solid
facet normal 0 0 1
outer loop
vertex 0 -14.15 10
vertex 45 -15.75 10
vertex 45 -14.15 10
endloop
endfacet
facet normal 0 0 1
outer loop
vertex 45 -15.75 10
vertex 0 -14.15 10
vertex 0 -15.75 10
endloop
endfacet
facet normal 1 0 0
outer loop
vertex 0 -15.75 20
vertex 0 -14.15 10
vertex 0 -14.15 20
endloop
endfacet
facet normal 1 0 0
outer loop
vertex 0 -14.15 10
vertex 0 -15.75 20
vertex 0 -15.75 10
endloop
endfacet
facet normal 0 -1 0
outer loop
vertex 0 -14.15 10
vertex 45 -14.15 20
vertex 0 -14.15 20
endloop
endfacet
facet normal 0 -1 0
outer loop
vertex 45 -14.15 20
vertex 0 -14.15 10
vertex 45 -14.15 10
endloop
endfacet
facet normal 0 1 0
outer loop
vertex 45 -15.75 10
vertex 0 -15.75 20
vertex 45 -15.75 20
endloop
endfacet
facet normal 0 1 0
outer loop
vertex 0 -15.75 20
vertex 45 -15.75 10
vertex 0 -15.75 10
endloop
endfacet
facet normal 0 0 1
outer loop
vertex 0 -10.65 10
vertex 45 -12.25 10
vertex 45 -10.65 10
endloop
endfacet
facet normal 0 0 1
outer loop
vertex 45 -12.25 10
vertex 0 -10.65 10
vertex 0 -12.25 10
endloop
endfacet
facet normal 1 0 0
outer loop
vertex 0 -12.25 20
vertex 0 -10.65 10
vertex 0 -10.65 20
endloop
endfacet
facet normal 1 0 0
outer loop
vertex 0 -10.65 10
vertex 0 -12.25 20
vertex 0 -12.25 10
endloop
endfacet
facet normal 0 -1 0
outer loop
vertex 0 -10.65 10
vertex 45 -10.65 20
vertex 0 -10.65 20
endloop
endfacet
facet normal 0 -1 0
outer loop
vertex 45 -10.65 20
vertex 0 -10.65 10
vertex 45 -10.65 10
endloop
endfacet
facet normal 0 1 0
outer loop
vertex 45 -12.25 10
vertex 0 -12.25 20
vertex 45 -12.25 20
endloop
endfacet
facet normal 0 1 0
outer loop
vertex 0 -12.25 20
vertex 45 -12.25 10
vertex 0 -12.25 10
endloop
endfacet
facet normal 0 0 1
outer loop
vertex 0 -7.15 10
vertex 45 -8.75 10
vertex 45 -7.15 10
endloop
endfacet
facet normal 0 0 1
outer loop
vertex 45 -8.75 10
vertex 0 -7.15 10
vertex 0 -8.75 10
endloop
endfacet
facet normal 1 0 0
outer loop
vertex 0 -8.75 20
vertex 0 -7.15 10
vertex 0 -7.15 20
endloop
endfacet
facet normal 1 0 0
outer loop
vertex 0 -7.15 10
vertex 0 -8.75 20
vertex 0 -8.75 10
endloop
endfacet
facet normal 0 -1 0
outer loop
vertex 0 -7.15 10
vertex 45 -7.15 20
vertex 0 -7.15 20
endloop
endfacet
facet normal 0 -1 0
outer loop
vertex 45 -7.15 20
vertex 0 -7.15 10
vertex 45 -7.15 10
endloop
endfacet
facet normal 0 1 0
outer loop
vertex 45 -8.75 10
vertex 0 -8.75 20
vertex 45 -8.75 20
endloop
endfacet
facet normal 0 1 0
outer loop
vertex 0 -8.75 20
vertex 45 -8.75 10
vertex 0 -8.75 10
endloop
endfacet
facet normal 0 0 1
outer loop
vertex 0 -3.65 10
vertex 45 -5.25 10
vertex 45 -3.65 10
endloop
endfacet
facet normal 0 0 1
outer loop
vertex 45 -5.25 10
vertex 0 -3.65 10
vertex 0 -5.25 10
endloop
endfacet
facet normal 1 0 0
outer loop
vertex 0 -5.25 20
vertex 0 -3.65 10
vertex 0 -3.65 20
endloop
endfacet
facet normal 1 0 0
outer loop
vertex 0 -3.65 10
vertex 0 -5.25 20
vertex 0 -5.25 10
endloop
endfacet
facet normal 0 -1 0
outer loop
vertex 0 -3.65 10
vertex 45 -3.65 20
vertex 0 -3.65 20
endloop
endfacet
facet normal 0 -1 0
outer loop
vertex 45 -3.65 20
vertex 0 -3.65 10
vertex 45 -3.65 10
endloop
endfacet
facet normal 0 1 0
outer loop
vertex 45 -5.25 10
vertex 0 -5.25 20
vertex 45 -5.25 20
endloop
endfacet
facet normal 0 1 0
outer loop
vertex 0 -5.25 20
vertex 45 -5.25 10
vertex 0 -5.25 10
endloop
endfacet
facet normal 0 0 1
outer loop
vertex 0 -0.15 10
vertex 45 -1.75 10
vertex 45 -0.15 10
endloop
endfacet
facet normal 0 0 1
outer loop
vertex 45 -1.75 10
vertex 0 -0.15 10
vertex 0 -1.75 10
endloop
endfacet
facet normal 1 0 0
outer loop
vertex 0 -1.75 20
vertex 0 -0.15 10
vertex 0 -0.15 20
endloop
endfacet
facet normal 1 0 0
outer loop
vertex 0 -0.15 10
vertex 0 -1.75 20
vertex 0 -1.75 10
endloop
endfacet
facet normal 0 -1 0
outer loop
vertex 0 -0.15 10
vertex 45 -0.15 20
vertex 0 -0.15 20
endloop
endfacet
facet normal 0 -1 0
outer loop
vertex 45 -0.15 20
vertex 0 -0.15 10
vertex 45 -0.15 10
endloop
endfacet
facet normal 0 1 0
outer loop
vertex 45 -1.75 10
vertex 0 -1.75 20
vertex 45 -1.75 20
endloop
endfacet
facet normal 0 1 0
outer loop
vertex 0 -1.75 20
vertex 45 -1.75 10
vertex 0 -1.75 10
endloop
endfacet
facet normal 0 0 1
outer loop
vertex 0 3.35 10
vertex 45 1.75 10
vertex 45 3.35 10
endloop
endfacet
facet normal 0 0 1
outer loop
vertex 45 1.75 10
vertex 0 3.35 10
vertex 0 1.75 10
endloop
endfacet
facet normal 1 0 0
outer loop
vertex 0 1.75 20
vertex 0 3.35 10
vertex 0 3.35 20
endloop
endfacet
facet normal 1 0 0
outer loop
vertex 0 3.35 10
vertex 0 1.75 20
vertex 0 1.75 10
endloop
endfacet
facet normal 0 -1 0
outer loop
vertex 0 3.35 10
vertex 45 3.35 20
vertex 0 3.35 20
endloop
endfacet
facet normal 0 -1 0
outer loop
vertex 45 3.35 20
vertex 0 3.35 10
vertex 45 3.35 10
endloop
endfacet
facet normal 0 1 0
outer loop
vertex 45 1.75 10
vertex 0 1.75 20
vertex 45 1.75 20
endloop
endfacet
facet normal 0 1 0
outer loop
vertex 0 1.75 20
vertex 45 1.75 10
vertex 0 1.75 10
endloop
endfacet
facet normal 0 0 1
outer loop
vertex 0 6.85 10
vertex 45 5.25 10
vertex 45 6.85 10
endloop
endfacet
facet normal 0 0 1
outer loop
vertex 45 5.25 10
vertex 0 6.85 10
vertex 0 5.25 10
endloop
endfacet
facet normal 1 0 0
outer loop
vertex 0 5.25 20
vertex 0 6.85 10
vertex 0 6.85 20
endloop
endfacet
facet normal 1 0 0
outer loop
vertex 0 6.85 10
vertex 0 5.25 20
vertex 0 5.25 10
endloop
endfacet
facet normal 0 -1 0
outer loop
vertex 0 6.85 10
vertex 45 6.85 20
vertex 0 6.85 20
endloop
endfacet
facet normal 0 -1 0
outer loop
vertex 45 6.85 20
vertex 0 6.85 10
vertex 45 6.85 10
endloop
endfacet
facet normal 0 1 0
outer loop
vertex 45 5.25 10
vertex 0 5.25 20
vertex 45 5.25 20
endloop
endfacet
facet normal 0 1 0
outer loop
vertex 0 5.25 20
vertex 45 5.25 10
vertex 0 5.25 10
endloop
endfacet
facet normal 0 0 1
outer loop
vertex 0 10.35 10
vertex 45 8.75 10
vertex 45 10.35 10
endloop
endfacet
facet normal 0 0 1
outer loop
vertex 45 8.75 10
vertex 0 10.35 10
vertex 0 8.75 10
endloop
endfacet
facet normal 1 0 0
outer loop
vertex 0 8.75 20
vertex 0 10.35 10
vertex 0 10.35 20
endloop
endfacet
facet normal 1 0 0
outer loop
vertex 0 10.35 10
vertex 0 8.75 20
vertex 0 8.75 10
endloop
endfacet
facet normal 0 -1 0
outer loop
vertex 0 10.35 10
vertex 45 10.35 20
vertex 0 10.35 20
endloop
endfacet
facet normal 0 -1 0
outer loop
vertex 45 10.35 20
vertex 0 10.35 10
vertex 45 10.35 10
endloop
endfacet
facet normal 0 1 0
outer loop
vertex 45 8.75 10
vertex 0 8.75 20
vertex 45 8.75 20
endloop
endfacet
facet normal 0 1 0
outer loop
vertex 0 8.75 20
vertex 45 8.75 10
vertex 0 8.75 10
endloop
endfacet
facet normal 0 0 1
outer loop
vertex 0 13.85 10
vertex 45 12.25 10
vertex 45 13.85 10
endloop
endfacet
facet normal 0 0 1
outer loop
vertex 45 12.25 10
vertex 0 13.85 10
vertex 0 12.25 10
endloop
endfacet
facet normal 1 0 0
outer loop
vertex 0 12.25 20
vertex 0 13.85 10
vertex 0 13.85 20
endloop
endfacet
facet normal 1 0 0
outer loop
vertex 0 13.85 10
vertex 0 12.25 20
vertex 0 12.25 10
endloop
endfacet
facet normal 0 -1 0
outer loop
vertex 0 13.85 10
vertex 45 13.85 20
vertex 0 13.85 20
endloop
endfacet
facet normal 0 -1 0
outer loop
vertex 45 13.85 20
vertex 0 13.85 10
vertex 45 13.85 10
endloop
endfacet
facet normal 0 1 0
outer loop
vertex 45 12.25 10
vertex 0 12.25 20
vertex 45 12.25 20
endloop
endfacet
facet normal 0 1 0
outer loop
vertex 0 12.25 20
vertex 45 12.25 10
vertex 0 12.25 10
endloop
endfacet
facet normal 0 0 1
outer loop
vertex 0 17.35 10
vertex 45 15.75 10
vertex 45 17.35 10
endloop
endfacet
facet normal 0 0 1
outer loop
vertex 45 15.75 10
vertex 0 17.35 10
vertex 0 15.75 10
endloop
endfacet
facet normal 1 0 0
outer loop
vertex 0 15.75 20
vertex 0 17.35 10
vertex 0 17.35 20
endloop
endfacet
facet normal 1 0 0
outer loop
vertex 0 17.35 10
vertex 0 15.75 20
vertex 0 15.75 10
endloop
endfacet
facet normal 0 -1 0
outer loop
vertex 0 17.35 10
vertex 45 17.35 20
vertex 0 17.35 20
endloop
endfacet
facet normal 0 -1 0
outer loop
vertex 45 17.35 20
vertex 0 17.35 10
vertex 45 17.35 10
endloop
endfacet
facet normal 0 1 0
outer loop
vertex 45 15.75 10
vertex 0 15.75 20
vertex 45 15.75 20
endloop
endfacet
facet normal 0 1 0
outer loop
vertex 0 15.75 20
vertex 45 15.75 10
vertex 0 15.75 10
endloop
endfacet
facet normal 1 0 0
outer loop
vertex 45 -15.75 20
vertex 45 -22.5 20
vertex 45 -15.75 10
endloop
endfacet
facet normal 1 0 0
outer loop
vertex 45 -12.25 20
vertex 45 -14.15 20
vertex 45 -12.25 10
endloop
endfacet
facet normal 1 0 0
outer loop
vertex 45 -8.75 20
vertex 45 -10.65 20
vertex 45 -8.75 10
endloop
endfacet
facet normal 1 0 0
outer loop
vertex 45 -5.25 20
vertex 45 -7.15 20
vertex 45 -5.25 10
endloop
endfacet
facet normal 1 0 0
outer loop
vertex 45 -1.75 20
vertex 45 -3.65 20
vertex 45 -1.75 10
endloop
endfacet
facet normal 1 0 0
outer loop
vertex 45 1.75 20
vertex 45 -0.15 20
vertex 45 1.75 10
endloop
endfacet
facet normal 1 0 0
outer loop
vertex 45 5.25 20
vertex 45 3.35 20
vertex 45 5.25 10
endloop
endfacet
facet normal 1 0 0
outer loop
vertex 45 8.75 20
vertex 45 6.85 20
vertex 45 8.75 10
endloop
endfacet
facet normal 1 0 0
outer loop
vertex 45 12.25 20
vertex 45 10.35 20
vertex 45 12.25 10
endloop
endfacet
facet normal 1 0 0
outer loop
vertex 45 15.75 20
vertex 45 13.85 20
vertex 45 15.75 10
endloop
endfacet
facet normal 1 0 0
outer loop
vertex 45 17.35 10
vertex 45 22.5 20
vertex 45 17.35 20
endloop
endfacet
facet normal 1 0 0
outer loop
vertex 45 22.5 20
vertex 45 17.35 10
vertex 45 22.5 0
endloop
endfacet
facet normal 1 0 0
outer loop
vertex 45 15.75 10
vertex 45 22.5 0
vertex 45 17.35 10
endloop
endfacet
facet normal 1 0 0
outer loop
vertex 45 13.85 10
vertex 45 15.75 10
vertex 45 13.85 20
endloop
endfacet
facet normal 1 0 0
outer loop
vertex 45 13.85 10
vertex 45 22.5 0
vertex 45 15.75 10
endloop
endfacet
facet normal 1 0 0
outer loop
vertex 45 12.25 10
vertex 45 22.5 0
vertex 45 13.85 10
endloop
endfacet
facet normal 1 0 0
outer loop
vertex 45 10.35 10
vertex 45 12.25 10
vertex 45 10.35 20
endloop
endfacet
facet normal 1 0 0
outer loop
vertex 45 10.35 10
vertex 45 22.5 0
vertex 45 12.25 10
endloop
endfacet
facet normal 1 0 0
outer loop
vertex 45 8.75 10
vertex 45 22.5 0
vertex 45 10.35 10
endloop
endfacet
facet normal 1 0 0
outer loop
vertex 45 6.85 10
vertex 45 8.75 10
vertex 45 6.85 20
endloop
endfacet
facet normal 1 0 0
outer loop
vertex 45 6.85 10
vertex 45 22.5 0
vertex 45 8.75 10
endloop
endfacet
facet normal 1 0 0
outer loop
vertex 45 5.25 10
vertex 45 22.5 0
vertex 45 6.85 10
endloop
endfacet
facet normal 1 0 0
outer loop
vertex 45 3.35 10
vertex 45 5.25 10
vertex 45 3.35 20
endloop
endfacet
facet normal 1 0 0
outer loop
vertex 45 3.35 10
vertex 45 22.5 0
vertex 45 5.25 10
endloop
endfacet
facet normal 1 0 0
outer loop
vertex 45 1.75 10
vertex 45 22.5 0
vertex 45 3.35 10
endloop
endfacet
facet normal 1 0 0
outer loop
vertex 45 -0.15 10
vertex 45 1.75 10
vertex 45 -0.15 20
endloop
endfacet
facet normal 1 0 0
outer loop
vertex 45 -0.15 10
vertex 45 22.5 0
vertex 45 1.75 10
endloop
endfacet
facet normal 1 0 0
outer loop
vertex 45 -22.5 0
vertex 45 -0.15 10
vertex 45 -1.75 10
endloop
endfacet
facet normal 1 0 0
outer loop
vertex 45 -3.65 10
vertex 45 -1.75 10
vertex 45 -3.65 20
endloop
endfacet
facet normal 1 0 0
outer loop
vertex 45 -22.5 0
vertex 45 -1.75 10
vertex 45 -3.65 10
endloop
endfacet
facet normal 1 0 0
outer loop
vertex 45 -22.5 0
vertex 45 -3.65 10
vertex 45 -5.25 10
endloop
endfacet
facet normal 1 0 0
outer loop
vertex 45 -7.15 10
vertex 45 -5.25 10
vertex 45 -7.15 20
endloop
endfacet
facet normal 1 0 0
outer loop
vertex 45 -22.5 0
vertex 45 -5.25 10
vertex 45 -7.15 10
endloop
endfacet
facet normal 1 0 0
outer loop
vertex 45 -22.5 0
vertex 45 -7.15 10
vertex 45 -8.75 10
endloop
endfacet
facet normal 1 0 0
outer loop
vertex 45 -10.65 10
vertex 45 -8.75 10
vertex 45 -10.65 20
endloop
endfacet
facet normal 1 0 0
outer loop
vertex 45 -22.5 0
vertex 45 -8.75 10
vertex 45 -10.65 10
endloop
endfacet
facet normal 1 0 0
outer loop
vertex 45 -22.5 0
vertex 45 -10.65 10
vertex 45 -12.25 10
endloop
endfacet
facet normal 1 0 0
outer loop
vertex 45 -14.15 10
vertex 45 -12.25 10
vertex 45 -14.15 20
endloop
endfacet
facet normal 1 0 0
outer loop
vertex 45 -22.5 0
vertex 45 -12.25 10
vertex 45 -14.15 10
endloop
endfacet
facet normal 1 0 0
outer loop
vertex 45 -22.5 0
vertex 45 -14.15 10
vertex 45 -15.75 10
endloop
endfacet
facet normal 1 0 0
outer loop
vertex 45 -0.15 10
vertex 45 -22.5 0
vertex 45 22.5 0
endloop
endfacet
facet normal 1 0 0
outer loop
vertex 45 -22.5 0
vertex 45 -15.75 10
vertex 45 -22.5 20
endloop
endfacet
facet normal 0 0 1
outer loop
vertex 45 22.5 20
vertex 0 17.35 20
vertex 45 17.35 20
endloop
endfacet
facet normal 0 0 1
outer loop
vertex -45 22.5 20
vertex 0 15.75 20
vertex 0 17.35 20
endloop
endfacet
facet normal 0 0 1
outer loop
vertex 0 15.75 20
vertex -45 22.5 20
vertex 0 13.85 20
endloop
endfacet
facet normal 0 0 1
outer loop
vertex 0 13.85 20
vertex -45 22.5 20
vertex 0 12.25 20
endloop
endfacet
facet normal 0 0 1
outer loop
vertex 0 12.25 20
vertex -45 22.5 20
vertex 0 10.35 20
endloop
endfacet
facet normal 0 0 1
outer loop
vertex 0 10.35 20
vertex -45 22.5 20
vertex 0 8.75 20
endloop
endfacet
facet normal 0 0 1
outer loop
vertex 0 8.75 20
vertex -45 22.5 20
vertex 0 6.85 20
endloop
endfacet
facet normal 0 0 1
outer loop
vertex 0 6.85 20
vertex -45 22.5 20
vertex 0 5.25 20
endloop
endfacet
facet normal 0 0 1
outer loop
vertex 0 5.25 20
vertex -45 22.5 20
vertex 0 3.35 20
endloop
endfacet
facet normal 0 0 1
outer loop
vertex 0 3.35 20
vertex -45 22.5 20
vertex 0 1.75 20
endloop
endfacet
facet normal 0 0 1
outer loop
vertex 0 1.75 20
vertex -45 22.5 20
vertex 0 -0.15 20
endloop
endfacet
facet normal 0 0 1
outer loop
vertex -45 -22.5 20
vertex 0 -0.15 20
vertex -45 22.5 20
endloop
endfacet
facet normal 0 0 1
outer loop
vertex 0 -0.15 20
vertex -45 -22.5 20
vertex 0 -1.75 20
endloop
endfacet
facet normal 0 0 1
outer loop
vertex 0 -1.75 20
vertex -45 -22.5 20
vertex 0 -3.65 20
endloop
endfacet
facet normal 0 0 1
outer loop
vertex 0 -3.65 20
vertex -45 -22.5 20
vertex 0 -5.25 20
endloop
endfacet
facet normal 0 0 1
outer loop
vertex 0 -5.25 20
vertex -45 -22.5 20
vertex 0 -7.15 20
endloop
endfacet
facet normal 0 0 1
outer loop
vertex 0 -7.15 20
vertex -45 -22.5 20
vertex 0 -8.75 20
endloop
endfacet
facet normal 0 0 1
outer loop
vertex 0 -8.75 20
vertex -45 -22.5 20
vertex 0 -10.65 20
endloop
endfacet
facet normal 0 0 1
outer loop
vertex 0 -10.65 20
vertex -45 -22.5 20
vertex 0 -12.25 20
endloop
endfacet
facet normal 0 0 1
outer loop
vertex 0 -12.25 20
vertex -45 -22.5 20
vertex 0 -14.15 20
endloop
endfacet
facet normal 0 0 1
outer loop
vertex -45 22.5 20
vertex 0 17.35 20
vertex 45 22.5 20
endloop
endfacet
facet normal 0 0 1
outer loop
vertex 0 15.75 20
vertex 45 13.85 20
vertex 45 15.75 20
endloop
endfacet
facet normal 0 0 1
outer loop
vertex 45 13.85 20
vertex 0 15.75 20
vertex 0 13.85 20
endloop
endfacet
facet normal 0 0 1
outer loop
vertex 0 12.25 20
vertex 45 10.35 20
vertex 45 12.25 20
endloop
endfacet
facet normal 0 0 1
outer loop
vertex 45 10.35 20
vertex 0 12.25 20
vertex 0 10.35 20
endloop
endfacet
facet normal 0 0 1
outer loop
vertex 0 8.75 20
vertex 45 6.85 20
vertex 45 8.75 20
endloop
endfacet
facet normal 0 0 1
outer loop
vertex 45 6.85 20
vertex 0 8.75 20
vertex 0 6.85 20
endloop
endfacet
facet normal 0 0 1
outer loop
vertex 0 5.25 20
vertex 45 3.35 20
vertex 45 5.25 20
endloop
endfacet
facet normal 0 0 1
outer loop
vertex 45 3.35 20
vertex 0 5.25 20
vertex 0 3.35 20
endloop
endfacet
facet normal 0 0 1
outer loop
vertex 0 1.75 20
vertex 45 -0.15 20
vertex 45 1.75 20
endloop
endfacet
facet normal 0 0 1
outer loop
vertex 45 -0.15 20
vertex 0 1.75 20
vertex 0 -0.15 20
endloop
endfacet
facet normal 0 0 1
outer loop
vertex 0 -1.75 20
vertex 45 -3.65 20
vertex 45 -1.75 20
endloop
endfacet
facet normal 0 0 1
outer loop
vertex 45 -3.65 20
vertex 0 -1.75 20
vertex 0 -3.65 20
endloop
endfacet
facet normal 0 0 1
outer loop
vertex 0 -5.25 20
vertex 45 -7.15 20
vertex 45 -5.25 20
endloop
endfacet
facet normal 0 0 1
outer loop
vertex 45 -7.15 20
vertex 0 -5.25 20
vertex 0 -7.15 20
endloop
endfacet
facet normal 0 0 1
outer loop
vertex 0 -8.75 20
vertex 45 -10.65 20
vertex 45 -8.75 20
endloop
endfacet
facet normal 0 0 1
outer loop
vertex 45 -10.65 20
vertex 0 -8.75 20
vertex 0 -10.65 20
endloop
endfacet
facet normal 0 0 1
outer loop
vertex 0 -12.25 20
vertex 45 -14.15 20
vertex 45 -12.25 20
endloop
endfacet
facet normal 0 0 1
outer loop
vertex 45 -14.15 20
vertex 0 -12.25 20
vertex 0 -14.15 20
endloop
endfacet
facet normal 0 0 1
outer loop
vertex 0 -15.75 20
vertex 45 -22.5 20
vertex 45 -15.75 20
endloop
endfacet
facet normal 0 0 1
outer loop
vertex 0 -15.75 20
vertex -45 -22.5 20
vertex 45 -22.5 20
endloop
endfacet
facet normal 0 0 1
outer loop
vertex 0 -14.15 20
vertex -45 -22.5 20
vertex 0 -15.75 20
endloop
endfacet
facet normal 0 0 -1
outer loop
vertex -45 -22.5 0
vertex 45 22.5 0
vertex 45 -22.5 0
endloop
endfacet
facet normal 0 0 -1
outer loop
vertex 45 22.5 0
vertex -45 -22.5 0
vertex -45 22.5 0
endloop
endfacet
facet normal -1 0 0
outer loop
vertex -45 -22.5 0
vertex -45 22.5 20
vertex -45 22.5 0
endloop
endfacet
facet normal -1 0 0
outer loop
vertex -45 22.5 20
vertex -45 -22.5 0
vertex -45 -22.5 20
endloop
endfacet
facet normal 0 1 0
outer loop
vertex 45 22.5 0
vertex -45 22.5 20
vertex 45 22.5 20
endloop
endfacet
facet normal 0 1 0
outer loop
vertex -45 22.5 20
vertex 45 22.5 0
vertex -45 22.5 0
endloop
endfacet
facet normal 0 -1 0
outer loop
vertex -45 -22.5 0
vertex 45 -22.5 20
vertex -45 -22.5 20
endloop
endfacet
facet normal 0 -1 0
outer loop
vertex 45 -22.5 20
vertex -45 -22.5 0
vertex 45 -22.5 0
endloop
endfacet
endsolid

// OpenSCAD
// Microscope slide drying rack
// Print orientation: base block on XY plane, slots open upward (+Z)

// ---------------- Parameters ----------------
block_len    = 90;    // block length along X (mm)
block_wid    = 45;    // block width along Y (mm)
block_h      = 20;    // block height along Z (mm)

slot_count   = 10;    // number of slide slots
slot_len     = 77;    // slot length along X (mm)
slot_w       = 1.6;   // slot width along Y (mm)
slot_depth   = 10;    // slot depth from top face (mm)
slot_pitch   = 3.5;   // centre-to-centre slot spacing along Y (mm)

eps          = 0.5;   // overcut past faces to avoid coplanar surfaces (mm)

$fn = 64;

// ---------------- Derived ----------------
slot_group_wid  = (slot_count - 1) * slot_pitch;   // span of slots in Y
slot_y_start    = -slot_group_wid / 2;             // first slot centre Y

// ---------------- Model ----------------
difference() {
    // Solid base block, centred in X and Y, resting on z = 0
    translate([-block_len / 2, -block_wid / 2, 0])
        cube([block_len, block_wid, block_h]);

    // Parallel slots running along X, open at the top
    for (i = [0 : slot_count - 1]) {
        translate([0, slot_y_start + i * slot_pitch, block_h - slot_depth])
            cube([slot_len, slot_w, slot_depth + eps]);
    }
}
